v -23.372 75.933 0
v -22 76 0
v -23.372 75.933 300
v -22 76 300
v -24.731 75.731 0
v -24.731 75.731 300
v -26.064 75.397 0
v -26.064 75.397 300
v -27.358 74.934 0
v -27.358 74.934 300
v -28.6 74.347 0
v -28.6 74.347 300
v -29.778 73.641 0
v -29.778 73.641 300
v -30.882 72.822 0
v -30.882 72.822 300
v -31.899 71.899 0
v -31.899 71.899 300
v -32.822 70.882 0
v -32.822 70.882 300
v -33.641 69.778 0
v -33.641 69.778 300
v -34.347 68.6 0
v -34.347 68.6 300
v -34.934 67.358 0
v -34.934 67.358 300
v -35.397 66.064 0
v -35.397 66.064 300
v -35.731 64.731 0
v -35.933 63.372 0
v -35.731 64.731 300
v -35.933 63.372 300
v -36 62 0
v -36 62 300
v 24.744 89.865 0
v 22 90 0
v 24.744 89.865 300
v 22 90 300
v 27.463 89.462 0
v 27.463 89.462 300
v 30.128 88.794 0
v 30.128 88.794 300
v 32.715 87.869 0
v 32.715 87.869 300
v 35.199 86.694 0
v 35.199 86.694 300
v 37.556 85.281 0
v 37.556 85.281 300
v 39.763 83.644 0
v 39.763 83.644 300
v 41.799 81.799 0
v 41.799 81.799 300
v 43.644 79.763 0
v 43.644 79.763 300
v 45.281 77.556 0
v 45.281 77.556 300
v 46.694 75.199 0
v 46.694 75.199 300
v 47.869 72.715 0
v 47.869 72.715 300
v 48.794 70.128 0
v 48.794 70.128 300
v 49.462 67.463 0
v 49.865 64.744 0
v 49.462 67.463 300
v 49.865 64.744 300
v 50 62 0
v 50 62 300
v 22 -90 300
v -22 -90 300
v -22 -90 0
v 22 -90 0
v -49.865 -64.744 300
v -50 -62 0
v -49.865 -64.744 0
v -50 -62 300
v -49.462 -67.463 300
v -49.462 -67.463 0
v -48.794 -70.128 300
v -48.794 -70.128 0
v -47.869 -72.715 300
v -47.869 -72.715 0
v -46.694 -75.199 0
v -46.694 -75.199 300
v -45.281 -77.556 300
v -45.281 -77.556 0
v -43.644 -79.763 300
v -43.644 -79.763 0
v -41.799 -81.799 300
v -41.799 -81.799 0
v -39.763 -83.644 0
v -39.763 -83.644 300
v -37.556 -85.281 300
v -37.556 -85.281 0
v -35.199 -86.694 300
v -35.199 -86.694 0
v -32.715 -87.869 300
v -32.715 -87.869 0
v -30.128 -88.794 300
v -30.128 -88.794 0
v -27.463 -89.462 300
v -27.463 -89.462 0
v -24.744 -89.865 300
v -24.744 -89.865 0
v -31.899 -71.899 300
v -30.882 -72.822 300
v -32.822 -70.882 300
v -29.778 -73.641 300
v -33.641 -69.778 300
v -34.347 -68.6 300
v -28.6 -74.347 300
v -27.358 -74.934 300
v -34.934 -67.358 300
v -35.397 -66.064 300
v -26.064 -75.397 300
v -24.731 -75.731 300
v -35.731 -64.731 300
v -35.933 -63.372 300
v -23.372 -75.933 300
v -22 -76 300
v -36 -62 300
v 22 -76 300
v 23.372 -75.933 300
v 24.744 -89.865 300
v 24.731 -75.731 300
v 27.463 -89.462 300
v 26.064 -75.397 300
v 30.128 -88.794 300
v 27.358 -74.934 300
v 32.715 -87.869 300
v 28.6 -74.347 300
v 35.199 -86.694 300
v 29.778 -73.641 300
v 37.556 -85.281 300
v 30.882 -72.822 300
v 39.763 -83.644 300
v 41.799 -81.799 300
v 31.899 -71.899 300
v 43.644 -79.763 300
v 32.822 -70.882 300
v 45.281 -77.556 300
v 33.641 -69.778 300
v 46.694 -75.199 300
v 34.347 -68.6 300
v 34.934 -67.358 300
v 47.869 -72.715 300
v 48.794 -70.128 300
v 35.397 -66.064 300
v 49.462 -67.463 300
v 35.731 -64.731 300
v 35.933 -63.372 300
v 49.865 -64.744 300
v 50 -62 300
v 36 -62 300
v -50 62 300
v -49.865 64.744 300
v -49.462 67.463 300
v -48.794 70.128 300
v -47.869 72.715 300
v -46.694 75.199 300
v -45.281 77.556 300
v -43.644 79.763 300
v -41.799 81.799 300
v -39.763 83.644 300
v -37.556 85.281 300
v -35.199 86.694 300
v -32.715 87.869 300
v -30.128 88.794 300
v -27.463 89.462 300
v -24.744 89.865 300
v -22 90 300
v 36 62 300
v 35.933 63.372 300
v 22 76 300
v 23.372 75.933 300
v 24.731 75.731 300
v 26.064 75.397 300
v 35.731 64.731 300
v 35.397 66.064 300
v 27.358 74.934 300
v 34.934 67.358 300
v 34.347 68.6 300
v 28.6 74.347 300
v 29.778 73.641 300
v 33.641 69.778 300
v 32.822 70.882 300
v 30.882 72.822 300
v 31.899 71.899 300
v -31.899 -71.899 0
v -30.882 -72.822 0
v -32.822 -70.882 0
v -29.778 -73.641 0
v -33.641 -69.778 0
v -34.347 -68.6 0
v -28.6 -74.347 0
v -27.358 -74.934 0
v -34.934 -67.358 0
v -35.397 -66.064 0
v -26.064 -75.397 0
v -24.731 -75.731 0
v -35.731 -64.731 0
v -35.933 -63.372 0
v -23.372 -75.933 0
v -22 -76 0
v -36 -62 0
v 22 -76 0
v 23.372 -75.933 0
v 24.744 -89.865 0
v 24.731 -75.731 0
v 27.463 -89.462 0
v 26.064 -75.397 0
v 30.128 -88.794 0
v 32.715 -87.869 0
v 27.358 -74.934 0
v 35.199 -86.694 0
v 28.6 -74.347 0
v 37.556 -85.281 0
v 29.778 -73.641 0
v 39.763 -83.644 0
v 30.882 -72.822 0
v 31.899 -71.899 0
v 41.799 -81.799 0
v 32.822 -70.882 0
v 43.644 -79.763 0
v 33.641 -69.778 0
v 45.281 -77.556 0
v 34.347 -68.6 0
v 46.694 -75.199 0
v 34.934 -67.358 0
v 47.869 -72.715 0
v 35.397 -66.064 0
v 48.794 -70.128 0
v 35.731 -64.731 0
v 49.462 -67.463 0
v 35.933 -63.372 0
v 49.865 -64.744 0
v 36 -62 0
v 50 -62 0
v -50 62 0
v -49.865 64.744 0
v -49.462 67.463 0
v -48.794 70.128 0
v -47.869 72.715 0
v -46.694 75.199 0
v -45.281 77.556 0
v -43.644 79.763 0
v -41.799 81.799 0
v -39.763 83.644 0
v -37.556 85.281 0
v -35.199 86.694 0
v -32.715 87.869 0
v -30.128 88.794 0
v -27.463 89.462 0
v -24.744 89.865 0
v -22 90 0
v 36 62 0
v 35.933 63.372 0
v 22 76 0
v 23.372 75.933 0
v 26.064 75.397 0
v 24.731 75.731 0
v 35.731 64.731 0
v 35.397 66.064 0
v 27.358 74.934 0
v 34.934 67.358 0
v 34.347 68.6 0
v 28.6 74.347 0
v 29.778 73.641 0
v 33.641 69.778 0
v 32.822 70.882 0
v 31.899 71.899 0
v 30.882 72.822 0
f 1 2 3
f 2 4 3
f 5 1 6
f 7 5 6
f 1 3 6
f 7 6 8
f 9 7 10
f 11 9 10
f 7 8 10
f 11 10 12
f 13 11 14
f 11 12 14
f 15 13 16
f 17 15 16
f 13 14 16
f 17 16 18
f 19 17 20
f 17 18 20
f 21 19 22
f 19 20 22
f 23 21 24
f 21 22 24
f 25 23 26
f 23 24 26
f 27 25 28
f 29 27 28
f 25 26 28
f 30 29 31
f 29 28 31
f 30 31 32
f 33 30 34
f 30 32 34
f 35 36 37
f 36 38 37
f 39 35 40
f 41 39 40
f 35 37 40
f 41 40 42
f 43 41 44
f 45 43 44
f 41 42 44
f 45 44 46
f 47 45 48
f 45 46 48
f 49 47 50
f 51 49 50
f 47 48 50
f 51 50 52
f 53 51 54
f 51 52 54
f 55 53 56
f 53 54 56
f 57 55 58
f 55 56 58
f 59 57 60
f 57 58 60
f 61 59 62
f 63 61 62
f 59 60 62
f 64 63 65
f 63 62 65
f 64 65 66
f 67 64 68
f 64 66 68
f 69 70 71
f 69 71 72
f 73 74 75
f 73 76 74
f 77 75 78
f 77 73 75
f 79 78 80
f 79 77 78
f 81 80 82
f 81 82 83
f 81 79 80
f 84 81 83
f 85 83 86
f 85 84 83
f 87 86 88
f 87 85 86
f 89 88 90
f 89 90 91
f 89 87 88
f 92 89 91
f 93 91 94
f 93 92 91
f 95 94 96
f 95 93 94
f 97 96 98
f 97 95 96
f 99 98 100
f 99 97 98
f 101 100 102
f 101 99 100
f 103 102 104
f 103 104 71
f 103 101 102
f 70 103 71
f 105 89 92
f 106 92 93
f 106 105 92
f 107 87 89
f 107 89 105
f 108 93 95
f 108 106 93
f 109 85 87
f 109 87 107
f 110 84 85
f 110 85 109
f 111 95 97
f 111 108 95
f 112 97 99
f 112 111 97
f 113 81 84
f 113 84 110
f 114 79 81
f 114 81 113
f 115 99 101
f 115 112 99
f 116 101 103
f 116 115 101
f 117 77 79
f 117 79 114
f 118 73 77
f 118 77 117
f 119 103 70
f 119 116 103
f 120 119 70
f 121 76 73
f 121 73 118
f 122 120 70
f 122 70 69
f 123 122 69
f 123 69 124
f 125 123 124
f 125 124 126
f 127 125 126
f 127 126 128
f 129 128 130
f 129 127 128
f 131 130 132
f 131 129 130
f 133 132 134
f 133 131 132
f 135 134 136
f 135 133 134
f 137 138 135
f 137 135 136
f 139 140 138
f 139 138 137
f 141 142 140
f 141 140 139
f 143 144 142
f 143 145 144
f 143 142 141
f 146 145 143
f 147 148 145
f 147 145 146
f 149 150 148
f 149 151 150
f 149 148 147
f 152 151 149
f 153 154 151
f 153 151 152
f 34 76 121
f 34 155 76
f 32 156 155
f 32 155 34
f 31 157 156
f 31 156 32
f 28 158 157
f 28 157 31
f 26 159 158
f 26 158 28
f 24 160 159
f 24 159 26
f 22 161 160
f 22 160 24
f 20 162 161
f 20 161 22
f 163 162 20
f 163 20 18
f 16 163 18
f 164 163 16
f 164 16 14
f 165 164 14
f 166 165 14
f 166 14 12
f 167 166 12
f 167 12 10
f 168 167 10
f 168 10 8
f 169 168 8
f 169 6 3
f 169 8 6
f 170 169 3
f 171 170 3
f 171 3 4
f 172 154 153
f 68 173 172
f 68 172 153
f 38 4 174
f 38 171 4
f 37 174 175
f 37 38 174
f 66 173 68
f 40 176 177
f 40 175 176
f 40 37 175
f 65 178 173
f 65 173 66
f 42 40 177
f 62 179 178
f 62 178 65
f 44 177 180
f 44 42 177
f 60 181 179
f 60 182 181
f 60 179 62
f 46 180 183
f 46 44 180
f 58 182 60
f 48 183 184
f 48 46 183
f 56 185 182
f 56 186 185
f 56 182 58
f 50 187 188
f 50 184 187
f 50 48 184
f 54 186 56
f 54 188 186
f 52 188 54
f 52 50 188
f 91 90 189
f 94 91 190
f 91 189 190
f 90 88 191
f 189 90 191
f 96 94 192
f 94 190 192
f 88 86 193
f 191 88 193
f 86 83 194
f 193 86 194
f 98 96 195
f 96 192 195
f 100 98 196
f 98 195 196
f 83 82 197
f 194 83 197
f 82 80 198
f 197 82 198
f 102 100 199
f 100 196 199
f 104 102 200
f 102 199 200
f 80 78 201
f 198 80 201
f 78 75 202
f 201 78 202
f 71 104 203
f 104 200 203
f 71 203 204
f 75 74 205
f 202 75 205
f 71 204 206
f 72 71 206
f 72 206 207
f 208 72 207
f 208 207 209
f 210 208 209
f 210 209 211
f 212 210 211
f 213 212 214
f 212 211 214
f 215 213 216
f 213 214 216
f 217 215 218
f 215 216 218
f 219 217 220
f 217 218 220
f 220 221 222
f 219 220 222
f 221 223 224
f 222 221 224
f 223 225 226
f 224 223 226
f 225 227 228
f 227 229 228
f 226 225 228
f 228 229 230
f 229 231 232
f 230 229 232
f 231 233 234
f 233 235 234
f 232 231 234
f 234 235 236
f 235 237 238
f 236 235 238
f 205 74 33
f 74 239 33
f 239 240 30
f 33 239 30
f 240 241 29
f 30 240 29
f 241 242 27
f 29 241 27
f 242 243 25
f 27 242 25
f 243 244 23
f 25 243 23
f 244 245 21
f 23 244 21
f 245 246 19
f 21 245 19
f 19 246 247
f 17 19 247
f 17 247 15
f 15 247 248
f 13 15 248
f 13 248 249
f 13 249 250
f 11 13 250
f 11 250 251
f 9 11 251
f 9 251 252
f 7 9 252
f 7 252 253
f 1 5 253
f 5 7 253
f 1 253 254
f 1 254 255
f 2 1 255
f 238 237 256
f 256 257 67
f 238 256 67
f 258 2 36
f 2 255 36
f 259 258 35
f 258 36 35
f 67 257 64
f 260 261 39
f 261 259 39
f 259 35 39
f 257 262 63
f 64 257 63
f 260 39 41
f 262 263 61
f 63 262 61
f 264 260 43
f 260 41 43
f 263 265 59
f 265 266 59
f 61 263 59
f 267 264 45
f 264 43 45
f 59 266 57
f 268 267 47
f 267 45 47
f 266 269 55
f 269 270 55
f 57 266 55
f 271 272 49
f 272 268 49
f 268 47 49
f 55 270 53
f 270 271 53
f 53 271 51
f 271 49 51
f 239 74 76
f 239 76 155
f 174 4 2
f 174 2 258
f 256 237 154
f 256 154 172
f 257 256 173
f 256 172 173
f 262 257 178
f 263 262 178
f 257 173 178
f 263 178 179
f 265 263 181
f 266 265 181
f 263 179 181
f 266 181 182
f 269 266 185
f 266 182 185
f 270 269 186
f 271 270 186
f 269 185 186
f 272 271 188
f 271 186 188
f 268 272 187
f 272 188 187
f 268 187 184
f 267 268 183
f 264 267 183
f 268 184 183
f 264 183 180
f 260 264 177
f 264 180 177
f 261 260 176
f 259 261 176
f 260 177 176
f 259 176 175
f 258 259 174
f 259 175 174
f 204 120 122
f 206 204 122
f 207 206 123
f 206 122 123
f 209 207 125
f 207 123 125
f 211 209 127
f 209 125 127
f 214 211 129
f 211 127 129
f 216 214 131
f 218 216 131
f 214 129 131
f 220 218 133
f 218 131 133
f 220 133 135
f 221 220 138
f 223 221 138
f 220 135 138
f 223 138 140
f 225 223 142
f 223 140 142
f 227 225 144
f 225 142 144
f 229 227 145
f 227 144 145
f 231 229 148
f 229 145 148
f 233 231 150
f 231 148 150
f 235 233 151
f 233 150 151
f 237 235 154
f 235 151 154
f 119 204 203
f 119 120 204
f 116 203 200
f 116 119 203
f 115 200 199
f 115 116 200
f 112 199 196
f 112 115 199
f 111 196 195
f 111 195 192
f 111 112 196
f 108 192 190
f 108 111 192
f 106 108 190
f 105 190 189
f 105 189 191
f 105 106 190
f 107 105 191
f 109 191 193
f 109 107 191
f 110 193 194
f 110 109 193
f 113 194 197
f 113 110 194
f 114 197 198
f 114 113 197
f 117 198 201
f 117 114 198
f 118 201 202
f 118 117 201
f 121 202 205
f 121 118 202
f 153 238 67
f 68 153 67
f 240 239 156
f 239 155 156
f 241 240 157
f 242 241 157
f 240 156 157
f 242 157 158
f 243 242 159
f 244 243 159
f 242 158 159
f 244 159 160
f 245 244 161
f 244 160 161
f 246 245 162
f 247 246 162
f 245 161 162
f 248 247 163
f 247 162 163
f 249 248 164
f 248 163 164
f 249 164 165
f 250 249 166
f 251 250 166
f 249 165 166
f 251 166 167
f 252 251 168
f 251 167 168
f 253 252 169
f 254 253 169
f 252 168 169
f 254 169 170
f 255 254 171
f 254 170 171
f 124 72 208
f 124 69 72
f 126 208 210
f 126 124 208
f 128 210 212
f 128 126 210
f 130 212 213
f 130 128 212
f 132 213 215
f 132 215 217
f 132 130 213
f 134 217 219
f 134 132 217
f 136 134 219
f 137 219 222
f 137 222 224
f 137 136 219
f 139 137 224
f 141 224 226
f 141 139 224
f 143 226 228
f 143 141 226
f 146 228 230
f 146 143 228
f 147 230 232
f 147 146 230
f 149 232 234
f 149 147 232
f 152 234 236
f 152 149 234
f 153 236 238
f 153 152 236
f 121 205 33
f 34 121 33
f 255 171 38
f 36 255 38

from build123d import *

# Parameters (mm, degrees)
SKETCH_1_W      = 100
SKETCH_1_H      = 180
SKETCH_1_W_2    = 72
SKETCH_1_H_2    = 152
EXTRUDE_1_DEPTH = 300
FILLET_1_R      = 14
FILLET_2_R      = 28


with BuildPart() as part:
    # 草图1 → 凸台-拉伸1 (new body)
    with BuildSketch(Plane.XY):
        Rectangle(SKETCH_1_W, SKETCH_1_H)
        Rectangle(SKETCH_1_W_2, SKETCH_1_H_2, mode=Mode.SUBTRACT)
    extrude(amount=EXTRUDE_1_DEPTH)

    # 圆角1
    fillet_1_edges = [part.edges().sort_by_distance(p)[0] for p in [
        (-36, 76, 150),
        (-36, -76, 150),
        (36, -76, 150),
        (36, 76, 150),
    ]]
    fillet(fillet_1_edges, radius=FILLET_1_R)

    # 圆角2
    fillet_2_edges = [part.edges().sort_by_distance(p)[0] for p in [
        (-50, 90, 150),
        (50, 90, 150),
        (50, -90, 150),
        (-50, -90, 150),
    ]]
    fillet(fillet_2_edges, radius=FILLET_2_R)


solid = part.part
